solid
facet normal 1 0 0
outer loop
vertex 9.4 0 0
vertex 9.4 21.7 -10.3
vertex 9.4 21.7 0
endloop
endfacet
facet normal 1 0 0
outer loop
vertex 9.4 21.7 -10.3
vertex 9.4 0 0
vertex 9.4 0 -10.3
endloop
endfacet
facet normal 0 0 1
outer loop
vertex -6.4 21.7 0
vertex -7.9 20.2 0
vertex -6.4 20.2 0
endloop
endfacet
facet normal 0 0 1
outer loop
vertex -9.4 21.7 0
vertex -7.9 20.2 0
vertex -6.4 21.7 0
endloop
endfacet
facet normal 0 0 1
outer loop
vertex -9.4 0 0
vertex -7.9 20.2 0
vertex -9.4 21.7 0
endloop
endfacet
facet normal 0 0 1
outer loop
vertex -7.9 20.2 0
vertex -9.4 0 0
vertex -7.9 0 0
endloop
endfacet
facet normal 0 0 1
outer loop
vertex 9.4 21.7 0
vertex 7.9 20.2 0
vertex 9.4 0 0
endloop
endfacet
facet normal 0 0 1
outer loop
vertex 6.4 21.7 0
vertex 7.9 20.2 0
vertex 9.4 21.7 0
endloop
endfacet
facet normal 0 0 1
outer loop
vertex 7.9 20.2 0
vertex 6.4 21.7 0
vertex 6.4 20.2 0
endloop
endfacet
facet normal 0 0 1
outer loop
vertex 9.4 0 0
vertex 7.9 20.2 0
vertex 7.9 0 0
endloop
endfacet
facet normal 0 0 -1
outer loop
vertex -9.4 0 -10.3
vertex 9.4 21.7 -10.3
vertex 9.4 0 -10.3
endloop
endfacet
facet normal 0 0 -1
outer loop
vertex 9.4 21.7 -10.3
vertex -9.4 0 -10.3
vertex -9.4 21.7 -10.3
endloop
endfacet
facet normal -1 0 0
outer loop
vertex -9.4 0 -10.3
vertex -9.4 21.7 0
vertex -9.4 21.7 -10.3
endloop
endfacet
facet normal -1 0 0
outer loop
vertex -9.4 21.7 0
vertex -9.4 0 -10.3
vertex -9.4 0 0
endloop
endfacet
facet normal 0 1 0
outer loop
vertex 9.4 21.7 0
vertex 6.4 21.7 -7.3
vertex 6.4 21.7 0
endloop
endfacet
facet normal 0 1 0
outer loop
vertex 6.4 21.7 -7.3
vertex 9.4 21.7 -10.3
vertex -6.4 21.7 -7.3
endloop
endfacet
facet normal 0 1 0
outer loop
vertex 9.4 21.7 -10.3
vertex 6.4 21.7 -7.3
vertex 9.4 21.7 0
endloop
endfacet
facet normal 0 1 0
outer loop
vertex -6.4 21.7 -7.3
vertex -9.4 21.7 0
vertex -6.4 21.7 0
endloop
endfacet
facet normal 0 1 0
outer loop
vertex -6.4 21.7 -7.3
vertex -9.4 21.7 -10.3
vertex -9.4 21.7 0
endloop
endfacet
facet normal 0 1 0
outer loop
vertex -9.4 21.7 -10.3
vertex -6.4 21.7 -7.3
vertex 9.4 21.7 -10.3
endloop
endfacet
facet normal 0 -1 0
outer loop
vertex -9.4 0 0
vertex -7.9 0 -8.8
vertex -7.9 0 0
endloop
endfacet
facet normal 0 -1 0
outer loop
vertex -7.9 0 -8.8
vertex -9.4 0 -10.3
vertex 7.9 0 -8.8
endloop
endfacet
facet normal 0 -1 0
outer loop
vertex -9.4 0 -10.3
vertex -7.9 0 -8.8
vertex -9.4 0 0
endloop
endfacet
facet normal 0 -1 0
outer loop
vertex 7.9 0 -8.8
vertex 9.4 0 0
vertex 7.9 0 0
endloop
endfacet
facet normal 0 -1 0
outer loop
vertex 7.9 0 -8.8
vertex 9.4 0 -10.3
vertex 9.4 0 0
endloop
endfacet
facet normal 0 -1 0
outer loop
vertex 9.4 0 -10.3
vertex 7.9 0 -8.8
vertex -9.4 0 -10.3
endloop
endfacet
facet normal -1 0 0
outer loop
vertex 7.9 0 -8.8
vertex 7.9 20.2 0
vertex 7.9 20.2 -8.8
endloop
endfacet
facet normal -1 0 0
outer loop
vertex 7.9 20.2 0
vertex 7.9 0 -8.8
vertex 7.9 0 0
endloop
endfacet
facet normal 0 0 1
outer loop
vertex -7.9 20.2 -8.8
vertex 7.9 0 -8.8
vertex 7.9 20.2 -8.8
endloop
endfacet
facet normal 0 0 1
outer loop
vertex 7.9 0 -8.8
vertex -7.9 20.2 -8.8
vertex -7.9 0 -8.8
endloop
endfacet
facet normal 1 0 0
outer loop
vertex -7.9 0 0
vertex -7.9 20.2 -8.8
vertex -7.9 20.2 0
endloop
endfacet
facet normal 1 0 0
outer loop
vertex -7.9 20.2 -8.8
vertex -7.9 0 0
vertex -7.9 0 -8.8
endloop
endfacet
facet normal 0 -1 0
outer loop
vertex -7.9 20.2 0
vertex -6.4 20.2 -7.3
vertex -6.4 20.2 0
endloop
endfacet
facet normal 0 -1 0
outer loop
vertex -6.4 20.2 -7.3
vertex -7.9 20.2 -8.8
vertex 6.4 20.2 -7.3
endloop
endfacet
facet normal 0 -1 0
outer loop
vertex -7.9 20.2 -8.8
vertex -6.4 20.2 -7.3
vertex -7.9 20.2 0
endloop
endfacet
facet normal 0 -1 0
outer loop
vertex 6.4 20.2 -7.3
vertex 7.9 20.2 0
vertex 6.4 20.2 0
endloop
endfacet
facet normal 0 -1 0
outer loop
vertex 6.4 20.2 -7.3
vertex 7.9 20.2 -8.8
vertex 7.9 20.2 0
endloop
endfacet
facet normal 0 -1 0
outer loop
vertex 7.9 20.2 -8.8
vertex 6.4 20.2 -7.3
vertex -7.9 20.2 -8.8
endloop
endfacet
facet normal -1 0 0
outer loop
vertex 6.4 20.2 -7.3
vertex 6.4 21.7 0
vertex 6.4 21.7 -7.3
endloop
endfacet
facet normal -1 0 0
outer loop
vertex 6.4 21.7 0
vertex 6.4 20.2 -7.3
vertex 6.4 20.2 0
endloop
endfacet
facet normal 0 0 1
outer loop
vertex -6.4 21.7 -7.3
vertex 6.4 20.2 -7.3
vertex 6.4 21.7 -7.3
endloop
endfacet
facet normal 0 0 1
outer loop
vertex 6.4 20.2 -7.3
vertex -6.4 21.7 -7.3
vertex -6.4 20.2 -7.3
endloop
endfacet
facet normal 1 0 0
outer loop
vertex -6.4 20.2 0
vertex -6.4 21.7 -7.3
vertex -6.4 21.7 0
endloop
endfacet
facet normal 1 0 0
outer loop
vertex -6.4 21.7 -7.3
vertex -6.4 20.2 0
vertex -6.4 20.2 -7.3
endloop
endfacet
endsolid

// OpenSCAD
// file: Configuration.scad
in = 25.4;
tubeInWidth = 10.5;
tubeWall = 2.8;
tubeOutWidth = tubeInWidth+2*tubeWall;

boltHead = 8.5; 
boltR = 2;

filletRad = 5;

module fillet(){
	difference(){
		translate([0,0,-.5]) cube([filletRad+2,filletRad+2,height+1]);
		translate([0,0,-1])cylinder(r=filletRad, h=height+2, $fn=60);
	}
}

	plugWidth = 15.8;
	plugHeight = 8.8;
	plugDepth = 20.2;
	wall = 1.5;
	hole = 1.5;
// main file
include <Configuration.scad>

difference(){
	translate([-(plugWidth+2*wall)/2,0,-plugHeight-wall])cube([plugWidth+(2*wall),plugDepth+wall,plugHeight+wall]);
	translate([-plugWidth/2,-.2,-plugHeight])cube([plugWidth,plugDepth+.2,plugHeight+.2]);
	translate([-(plugWidth-2*hole)/2,5,-plugHeight+hole])cube([plugWidth-(2*hole),plugDepth-hole,plugHeight-hole+.2]);
}
